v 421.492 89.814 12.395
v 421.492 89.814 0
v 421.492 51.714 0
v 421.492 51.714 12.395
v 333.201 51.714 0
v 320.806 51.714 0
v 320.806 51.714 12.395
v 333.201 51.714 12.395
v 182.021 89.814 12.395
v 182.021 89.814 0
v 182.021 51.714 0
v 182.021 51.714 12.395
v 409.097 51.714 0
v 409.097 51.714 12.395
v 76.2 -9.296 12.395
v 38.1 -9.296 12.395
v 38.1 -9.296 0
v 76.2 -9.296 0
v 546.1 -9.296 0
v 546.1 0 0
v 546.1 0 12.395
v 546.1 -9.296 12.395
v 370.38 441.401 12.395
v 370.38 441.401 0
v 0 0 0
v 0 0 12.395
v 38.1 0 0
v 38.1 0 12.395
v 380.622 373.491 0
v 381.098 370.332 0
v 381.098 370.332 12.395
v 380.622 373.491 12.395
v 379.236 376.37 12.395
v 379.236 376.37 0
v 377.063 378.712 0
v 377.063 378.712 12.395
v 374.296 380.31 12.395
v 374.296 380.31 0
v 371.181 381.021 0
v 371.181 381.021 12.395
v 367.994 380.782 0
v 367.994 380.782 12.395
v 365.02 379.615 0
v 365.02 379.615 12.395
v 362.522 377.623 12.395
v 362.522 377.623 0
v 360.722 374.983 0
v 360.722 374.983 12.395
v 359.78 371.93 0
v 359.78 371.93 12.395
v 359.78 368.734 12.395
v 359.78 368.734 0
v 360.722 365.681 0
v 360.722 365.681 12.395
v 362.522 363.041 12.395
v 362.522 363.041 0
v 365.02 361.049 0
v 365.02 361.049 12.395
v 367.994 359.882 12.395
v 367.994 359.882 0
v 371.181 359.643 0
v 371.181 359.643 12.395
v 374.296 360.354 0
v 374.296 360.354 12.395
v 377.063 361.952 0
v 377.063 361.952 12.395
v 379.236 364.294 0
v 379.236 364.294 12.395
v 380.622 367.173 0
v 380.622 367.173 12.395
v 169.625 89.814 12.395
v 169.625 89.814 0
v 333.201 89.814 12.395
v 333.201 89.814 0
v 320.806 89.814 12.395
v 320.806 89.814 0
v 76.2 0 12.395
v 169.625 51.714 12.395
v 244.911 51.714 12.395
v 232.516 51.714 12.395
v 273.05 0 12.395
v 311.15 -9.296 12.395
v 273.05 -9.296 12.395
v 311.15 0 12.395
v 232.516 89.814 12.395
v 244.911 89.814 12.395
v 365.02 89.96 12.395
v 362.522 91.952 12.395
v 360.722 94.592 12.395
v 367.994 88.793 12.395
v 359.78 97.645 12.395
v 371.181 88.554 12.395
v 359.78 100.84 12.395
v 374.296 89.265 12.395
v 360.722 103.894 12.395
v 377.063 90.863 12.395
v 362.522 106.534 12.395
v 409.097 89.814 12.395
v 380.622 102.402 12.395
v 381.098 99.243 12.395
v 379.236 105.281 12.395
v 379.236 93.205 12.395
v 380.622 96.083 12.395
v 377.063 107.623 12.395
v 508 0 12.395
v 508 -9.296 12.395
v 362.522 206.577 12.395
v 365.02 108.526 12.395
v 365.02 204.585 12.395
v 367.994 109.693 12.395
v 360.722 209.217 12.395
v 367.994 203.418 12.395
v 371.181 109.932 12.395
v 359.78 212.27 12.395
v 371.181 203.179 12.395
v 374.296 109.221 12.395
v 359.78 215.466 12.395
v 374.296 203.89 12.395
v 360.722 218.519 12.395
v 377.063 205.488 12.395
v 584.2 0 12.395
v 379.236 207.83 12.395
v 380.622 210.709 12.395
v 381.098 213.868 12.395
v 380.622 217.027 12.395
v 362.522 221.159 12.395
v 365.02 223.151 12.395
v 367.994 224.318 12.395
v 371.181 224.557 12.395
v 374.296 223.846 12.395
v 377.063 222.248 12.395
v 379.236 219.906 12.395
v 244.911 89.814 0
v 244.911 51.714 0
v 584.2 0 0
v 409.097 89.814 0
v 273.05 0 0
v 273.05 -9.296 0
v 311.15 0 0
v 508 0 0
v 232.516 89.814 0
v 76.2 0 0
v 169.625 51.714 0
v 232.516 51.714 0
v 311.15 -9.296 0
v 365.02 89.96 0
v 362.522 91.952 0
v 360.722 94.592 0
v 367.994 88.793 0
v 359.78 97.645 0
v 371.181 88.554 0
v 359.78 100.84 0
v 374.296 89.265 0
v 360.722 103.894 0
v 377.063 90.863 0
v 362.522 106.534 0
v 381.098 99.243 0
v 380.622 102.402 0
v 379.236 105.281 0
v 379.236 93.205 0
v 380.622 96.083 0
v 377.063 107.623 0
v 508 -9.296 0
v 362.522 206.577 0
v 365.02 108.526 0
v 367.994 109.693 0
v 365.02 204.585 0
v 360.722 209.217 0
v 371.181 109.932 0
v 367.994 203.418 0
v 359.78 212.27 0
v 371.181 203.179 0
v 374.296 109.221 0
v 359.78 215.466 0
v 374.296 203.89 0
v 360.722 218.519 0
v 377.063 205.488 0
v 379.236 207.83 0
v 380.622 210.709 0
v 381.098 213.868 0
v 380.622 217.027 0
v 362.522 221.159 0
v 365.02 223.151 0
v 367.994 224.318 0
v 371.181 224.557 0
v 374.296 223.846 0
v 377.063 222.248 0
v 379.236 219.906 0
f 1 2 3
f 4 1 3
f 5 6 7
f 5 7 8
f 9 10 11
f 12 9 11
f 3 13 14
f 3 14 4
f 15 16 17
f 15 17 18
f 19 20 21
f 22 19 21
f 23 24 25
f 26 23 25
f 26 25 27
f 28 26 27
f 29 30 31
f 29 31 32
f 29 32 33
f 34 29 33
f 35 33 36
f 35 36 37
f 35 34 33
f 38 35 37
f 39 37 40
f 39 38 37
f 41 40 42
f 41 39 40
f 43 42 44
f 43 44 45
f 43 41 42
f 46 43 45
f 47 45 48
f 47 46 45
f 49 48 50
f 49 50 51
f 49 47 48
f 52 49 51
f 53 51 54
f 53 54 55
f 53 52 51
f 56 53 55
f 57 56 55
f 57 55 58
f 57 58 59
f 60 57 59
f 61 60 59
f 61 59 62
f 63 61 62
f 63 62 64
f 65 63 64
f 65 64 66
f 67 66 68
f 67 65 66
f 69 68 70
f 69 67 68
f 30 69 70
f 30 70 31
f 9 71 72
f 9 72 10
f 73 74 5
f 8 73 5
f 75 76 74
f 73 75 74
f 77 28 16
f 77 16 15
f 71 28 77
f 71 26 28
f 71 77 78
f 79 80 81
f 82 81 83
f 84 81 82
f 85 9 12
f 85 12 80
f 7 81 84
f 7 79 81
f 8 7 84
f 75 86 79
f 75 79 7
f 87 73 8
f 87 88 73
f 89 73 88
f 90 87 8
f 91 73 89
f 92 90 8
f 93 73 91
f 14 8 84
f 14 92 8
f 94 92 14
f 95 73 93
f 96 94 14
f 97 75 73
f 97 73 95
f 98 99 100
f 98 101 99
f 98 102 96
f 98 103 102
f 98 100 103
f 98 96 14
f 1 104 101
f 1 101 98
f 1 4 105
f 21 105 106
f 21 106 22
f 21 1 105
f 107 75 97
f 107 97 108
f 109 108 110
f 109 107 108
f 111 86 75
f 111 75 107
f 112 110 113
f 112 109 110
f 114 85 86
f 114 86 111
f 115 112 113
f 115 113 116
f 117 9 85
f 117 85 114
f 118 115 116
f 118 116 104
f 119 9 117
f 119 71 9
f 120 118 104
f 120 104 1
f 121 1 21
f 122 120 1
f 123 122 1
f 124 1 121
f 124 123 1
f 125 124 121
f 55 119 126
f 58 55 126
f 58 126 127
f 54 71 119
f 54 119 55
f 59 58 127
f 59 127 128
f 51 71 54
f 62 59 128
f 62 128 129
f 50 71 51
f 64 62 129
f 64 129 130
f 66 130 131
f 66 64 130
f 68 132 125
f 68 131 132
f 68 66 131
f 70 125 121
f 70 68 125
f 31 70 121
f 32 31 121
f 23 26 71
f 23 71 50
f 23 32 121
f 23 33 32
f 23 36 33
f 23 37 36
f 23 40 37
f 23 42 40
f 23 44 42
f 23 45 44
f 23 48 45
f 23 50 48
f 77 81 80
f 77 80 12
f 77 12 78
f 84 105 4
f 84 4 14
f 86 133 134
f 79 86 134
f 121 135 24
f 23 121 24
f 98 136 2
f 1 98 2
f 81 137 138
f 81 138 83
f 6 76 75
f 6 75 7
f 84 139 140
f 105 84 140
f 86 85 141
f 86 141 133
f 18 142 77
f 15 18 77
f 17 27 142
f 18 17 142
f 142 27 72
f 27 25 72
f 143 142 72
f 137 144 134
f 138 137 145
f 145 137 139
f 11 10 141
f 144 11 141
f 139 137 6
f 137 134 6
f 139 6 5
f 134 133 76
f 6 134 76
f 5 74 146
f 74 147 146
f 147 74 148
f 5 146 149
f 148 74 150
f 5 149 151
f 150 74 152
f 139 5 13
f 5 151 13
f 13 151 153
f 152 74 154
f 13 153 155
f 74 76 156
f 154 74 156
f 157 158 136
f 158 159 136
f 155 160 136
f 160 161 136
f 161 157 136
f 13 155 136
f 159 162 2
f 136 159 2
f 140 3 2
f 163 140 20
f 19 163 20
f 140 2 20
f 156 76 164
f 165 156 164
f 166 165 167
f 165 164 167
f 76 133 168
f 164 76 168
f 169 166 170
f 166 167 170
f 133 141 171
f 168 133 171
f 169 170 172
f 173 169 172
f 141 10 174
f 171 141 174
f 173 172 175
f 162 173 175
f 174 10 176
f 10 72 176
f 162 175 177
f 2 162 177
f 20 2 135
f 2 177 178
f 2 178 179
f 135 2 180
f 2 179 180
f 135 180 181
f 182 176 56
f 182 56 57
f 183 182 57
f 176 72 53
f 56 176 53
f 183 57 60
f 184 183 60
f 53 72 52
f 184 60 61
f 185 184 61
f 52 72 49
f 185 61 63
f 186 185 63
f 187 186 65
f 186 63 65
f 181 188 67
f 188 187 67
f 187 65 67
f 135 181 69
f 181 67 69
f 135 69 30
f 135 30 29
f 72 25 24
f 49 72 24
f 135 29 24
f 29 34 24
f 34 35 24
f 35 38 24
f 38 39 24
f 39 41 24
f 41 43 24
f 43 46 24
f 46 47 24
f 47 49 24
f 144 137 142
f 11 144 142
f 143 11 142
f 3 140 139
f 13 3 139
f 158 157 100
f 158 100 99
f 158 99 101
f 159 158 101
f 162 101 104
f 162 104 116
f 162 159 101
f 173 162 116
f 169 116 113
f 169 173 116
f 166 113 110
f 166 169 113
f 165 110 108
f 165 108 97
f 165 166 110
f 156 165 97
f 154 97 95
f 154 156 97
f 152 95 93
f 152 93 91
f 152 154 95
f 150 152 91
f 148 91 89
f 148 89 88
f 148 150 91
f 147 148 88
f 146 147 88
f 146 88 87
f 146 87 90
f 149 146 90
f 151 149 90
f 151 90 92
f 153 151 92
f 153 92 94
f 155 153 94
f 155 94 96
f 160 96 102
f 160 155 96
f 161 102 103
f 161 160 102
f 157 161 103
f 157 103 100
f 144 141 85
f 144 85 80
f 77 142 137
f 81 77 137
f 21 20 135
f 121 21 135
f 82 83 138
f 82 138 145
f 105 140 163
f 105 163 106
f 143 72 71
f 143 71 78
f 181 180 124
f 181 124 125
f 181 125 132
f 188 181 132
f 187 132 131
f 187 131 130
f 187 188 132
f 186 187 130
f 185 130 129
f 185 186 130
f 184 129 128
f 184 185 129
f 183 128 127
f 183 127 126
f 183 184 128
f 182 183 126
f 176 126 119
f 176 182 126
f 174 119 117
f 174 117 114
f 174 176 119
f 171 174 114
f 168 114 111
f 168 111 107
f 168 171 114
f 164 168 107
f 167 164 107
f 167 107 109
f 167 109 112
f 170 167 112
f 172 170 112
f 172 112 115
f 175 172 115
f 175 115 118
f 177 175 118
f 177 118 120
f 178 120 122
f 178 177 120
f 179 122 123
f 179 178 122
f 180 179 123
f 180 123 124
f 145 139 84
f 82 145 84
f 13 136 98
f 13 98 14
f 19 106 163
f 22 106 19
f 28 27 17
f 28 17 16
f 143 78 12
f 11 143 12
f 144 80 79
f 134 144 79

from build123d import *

# Parameters (mm, degrees)
F0_R     = 10.7188
F1_DEPTH = 12.3952
F2_W     = 38.1
F2_H     = 12.3952
F3_DEPTH = 9.2964
F4_W     = 12.3952
F4_H     = 38.1
F5_DEPTH = 12.3952


with BuildPart() as f1:
    # F0 (on Top) → F1 (new body)
    with BuildSketch(Plane.XY):
        Polygon((370.379505, 441.401105), (0, 0), (584.2, 0), align=None)
        with Locations((370.379505, 99.24288)):
            Circle(F0_R, mode=Mode.SUBTRACT)
        with Locations((370.379505, 213.868)):
            Circle(F0_R, mode=Mode.SUBTRACT)
        with Locations((370.379505, 370.332)):
            Circle(F0_R, mode=Mode.SUBTRACT)
    extrude(amount=F1_DEPTH)

    # F2 (on face) → F3 (join)
    with BuildSketch(Plane.XZ):
        with Locations((57.15, 6.1976)):
            Rectangle(F2_W, F2_H)
        with Locations((292.1, 6.1976)):
            Rectangle(F2_W, F2_H)
        with Locations((527.05, 6.1976)):
            Rectangle(F2_W, F2_H)
    extrude(amount=F3_DEPTH)

    # F4 (on face) → F5 (cut, through all)
    with BuildSketch(Plane(origin=(0, 0, 0), x_dir=(1, 0, 0), z_dir=(0, 0, -1))):
        with Locations((415.294277, -70.7644)):
            Rectangle(F4_W, F4_H)
        with Locations((327.003877, -70.7644)):
            Rectangle(F4_W, F4_H)
        with Locations((238.713477, -70.7644)):
            Rectangle(F4_W, F4_H)
        with Locations((175.823077, -70.7644)):
            Rectangle(F4_W, F4_H)
    extrude(amount=-F5_DEPTH, mode=Mode.SUBTRACT)


solid = f1.part
